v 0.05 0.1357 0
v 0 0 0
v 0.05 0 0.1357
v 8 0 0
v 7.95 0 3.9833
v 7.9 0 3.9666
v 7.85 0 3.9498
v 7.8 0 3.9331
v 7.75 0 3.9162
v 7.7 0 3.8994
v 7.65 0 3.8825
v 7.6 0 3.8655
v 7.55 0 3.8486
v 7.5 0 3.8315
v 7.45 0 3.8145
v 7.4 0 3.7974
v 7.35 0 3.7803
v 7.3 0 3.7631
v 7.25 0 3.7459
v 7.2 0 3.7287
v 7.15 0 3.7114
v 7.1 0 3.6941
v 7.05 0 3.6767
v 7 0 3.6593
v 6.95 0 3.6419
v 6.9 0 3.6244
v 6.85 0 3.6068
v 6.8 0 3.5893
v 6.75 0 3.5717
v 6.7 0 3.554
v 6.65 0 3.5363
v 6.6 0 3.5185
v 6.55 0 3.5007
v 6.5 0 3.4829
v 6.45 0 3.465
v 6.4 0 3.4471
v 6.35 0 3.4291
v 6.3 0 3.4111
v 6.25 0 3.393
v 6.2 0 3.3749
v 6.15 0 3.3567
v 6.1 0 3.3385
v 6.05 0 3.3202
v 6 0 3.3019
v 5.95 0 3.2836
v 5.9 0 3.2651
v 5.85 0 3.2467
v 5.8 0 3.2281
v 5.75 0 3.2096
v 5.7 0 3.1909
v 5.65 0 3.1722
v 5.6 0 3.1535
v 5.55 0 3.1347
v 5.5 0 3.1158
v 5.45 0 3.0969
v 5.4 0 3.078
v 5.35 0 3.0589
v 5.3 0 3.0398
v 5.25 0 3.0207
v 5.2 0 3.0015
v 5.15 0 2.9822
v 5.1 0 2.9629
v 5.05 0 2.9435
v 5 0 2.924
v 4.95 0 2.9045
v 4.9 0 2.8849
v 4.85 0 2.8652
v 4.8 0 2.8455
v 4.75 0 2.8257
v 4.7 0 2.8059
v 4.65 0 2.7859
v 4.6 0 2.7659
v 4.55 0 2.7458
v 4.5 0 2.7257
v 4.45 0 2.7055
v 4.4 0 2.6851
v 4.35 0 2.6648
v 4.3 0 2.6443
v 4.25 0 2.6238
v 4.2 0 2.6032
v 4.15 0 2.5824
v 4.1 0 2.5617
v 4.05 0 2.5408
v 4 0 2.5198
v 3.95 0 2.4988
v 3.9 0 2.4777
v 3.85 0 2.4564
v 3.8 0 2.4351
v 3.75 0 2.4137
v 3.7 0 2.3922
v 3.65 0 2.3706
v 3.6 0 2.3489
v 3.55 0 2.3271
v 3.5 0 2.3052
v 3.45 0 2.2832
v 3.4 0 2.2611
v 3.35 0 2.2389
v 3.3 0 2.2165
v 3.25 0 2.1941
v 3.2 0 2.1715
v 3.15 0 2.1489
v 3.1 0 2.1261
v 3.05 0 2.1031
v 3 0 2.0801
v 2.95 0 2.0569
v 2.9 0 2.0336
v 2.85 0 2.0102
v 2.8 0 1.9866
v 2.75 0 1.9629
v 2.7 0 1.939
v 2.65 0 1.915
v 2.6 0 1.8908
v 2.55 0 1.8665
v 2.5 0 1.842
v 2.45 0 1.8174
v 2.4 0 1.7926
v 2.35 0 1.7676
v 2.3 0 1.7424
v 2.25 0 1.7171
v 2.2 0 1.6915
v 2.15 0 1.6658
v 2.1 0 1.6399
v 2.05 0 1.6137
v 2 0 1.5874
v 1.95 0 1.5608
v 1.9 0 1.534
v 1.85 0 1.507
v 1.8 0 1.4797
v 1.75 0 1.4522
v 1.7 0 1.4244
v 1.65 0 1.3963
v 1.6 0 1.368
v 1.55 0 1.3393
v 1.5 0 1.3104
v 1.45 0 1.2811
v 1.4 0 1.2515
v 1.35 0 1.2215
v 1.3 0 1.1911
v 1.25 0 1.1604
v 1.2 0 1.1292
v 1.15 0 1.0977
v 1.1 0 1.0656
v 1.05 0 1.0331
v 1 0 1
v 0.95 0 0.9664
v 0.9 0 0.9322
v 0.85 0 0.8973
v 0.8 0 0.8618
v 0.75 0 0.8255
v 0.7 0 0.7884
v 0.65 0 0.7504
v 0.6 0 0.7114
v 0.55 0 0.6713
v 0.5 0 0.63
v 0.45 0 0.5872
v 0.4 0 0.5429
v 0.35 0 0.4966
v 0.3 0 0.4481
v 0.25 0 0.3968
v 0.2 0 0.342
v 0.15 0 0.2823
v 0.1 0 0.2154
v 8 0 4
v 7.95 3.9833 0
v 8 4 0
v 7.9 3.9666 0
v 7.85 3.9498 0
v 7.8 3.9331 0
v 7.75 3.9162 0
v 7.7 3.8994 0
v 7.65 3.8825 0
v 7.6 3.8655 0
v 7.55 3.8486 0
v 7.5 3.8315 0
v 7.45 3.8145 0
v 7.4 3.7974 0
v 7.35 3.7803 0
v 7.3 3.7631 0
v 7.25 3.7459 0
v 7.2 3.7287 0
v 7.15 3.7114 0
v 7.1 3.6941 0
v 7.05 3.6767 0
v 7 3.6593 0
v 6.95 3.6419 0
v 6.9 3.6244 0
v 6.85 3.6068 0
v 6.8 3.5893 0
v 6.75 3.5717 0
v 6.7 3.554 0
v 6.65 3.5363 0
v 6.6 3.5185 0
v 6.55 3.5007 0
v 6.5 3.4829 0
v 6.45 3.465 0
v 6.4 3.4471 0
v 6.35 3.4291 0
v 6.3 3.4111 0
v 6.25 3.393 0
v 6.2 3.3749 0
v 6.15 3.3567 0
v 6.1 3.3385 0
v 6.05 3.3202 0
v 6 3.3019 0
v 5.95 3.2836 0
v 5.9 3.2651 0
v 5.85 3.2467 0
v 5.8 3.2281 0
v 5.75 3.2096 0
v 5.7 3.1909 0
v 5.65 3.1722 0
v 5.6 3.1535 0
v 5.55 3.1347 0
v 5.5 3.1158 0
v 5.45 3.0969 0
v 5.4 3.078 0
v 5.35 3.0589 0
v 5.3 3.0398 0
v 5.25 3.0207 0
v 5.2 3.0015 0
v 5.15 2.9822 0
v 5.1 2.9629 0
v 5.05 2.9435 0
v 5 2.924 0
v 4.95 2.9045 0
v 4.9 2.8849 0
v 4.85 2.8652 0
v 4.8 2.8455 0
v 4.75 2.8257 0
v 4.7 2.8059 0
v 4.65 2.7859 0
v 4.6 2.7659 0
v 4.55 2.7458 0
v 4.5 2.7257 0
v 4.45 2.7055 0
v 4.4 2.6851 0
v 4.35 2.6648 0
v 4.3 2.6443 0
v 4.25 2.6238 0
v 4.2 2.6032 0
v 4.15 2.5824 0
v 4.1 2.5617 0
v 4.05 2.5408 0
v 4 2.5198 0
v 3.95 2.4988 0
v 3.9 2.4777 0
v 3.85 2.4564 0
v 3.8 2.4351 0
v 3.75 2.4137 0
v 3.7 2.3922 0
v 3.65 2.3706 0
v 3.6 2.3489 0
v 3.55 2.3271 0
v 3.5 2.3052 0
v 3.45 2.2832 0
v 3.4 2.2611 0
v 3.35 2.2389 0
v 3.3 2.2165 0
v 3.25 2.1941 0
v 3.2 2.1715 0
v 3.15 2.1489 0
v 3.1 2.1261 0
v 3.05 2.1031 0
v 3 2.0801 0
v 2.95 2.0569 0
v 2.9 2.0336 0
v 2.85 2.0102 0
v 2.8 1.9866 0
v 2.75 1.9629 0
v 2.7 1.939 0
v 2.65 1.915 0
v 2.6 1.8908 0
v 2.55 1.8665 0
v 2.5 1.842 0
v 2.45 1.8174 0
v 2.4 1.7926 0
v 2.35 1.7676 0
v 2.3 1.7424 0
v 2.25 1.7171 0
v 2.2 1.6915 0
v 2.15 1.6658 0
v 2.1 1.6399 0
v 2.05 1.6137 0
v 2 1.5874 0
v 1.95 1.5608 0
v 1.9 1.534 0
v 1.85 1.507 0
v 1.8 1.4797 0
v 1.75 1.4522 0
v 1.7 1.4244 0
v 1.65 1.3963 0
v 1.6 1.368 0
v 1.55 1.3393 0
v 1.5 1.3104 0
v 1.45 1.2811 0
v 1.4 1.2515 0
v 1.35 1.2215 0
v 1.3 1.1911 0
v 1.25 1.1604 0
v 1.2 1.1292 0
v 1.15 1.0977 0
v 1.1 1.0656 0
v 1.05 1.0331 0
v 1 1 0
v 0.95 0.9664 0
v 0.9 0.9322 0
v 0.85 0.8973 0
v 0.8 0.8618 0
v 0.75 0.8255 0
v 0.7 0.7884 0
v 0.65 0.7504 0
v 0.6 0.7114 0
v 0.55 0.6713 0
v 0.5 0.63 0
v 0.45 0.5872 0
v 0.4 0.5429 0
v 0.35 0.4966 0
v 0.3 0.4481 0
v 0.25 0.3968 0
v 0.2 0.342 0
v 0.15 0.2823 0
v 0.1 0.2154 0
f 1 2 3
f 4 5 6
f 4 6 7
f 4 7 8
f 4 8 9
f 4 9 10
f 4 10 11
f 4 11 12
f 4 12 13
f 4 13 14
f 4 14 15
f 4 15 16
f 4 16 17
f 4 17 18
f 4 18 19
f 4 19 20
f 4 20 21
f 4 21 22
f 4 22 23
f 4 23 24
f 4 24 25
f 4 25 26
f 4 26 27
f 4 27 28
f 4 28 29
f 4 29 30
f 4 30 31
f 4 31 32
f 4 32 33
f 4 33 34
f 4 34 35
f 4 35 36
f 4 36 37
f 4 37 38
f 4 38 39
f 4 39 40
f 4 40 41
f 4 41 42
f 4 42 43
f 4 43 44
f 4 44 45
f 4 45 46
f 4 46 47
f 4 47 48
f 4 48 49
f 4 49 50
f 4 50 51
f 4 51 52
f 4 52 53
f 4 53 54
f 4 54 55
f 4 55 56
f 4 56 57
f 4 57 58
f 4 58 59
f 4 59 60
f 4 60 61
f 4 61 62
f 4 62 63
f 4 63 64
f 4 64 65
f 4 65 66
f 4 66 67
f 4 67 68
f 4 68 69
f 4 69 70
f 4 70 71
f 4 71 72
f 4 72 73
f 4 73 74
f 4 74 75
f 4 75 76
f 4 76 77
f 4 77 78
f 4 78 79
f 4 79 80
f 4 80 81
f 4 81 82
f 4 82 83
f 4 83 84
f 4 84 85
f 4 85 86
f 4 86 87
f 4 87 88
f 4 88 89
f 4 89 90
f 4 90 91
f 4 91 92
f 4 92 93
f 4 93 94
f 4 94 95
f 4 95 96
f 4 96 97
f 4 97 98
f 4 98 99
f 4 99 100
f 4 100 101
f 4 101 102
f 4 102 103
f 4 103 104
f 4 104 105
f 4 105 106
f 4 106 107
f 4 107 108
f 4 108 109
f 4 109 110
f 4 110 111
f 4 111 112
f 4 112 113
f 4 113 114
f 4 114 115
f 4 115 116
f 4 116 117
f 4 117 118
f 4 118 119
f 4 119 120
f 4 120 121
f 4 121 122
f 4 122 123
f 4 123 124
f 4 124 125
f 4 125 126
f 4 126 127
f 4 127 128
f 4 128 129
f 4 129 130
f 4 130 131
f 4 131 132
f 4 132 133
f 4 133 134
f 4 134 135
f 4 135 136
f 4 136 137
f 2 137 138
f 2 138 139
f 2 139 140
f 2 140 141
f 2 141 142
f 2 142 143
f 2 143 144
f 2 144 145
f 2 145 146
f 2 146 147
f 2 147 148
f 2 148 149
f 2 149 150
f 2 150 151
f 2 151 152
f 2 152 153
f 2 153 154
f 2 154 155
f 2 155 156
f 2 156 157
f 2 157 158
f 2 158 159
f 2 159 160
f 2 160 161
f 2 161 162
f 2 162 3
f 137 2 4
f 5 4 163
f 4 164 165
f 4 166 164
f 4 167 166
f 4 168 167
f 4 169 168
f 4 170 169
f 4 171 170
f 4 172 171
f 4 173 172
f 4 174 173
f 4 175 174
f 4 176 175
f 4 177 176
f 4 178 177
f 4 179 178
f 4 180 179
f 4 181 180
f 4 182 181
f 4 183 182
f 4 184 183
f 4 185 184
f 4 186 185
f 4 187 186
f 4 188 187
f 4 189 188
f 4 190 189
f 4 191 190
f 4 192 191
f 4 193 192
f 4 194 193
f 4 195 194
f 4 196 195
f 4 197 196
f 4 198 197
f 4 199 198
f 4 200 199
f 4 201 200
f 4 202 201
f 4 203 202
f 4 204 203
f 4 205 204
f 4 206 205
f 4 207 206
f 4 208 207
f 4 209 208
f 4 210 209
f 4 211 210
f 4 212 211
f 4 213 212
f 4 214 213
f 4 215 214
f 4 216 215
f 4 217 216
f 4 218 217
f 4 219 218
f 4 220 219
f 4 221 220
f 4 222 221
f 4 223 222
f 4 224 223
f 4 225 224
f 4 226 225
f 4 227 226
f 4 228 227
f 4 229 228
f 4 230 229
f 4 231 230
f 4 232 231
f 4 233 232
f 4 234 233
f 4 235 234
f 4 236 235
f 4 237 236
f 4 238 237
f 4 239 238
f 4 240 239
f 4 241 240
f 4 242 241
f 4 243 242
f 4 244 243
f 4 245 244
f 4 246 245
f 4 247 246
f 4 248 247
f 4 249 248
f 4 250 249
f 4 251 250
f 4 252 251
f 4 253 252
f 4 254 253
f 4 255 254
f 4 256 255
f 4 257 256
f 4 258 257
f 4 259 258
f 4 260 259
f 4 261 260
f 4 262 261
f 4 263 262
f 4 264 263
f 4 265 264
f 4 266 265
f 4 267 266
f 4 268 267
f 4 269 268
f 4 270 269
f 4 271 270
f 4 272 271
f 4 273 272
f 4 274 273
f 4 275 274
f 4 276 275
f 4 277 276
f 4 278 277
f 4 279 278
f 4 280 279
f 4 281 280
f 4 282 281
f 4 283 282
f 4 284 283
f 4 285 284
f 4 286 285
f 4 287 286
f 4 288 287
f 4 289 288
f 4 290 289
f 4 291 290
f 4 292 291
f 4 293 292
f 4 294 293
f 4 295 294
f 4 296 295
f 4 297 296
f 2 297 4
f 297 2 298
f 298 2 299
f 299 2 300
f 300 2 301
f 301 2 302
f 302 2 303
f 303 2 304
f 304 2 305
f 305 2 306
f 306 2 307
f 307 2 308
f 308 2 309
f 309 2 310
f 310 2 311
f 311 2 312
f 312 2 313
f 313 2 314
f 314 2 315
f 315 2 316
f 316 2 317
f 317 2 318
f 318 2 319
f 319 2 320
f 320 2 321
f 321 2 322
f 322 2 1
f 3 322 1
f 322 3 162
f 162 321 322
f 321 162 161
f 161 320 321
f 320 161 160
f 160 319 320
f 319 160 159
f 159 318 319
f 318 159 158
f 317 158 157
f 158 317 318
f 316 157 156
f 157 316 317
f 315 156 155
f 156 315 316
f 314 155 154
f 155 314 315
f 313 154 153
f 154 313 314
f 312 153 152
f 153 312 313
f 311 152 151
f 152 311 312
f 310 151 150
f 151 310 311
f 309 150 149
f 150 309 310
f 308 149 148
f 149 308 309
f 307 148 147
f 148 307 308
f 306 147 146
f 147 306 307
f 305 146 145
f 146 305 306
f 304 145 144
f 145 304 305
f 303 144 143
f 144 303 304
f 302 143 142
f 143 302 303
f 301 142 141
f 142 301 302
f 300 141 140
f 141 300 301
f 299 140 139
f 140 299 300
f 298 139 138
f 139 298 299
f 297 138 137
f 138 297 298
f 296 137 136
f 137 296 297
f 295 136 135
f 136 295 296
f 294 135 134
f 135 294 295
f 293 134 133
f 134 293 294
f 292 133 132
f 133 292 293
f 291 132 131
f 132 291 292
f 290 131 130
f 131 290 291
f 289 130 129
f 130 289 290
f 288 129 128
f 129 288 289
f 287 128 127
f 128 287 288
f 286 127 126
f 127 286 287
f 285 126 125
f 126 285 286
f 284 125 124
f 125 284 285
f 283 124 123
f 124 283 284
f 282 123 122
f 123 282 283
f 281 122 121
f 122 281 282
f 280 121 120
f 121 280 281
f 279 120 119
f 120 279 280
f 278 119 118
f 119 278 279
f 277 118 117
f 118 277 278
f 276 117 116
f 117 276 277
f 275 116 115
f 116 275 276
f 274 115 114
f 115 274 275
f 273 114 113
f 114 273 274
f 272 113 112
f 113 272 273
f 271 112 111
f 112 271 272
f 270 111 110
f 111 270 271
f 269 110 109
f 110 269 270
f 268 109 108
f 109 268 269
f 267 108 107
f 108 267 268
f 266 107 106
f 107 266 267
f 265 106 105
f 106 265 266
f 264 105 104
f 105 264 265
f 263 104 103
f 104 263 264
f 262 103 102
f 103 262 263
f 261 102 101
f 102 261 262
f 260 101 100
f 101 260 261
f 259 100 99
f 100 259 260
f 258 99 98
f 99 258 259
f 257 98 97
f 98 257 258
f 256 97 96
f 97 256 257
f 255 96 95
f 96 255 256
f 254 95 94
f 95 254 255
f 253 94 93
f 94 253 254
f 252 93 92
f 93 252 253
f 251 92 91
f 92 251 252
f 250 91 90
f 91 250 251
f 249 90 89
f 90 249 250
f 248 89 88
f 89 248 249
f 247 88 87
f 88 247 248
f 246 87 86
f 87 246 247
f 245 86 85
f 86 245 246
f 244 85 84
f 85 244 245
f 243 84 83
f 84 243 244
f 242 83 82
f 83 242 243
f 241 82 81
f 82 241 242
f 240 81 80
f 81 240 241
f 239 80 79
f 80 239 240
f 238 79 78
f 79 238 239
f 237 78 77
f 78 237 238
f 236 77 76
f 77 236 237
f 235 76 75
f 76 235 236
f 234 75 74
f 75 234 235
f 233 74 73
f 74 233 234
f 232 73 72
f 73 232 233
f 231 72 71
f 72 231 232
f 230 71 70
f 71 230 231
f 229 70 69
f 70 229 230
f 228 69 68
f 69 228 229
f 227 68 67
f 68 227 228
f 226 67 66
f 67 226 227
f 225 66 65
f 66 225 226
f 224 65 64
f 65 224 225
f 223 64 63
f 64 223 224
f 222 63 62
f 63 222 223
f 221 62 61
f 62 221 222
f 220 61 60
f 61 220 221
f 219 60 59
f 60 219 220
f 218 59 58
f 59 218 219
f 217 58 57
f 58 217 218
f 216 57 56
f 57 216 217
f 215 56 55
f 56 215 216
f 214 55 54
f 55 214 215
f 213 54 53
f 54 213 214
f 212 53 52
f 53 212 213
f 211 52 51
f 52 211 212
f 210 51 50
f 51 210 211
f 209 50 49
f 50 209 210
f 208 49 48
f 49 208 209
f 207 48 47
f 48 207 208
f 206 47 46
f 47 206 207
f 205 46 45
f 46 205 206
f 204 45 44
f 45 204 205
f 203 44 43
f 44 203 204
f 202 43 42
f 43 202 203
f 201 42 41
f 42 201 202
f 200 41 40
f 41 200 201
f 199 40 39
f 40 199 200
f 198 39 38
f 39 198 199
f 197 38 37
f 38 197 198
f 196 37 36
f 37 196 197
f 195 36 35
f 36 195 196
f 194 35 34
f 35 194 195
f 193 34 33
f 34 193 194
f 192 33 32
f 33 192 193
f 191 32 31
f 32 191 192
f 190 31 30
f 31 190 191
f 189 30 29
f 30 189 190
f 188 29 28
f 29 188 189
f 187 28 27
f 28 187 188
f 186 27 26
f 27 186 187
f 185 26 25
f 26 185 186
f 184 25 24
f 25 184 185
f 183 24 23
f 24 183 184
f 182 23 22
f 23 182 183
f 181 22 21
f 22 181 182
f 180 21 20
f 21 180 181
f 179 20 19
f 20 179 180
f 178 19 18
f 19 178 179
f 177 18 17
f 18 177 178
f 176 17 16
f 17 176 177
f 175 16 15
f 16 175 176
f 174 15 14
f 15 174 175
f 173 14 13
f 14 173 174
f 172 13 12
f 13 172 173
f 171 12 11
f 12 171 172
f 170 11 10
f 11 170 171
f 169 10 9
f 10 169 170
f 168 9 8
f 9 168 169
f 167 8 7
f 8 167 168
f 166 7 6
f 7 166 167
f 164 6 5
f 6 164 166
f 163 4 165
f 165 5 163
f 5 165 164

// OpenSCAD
// Models 3D objects by taking a 2D base (defined by two functions and two x values), slicing it up perpendicular to the X-axis, and using the resulting line as a base for another 2D object.
// The slices are trapezoidal approximations with adjustable width.
// It can also rotate about the X- and Y-axis.


// starting x value
StartX = 0;
// ending x value
EndX = 8;
// size of slice
StepX = 0.05;


// f(x) and g(x) are functions.
// Math functions can be found here:
// https://openscad.org/cheatsheet
function f(x) = x^(2/3);
function g(x) = 0;


// "Slice" should be a list of points of [y,z].  These are the slices.
// It will later be scaled so that difference between f(x) and g(x) is 1, and translated so that [0,0] is on the line f(x).
// This means that any shape with a flat base will start off with "Slice = [[0,0], [1,0], ..."
// Also, please contain the y values to between 0 and 1.
// ...or you could just use one of these pre-made ones by uncommenting it and commenting out the rest.
// (Comments are denoted by the "//" at the beginning of the line.)

// semicircle
//Slice = [for(a = [0:1:180]) [(cos(a)/2)+0.5, (sin(a)/2)]];

// circle (not rotation)
//Slice = [for(a = [0:1:360]) [(cos(a)/2)+0.5, (sin(a)/2)]];

// isosceles right triangle with leg on base(right angle closest to x axis)
Slice = [[0,0], [1,0], [0,1]];

// isosceles right triangle with leg on base(right angle farthest from x axis)
//Slice = [[0,0], [1,0], [1,1]];

// isosceles right triangle with hypotenuse on base
//Slice = [[0,0], [1,0], [0.5,0.5]];

// equilateral triangle
//Slice = [[0,0], [1,0], [0.5,(3^(1/2))/2]];

// square
//Slice = [[0,0], [1,0], [1,1], [0,1]];


// This should be "true" or "false".  If it is "false", it does regular slices.  If it is "true", it rotates about an axis.
// Note: If you rotate, neither of the functions can be negative.
Rotation = false;

// This is for rotation, the number of sides the circle has.  If it is "false", sets it to OpenSCAD's default value.
NumberOfSteps = 100;

// If it is "true", it will rotate around the X-Axis. If it is "false", it will rotate around the Y-Axis
XAxisRotation = false;


// That's it! Everything else is code that doesn't need to change.
// If you are having problems you could try:
// https://openscad.org/cheatsheet
// https://en.wikibooks.org/wiki/OpenSCAD_User_Manual
// or me: rfboerwinkle@gmail.com


// P.S. If you want holes, you can use this "Paths" variable.  You can learn more in the user manual.
Paths = false;

if(Rotation){
	polygonpoints = [for (x = [StartX:StepX:EndX]) [x,f(x)], for (x = [EndX:-StepX:StartX]) [x,g(x)]];
	if(XAxisRotation){
		rotate(a = [0,-90,0])
		rotate_extrude($fn = NumberOfSteps)
		rotate(a = [0,0,-90])
		polygon(points = polygonpoints);
	}else{
		rotate(a = [-90,0,0])
		rotate_extrude($fn = NumberOfSteps)
		polygon(points = polygonpoints);
	}
}else{
	pointlist = [for (x = [StartX:StepX:EndX]) [x, (f(x)>g(x)?f(x):g(x)), (f(x)>g(x)?g(x):f(x))]];
	for(i = [1:len(pointlist)-1]){
		if((pointlist[i][1] - pointlist[i][2]) != 0){
			scalefactor = (pointlist[i-1][1] - pointlist[i-1][2]) / (pointlist[i][1] - pointlist[i][2]);
			distance = (scalefactor == 0) ? -pointlist[i-1][1] : (((pointlist[i][2] - pointlist[i-1][2]) / (1-scalefactor)) - pointlist[i][2]);
			rotate(a = [90,0,90])
			mirror(v = [0,0,1])
			translate(v = [-distance,0,-pointlist[i][0]])
			linear_extrude(height = StepX, scale = scalefactor, slices = 1)
			translate(v = [distance,0,0])
			translate(v = [pointlist[i][2],0,0])
			resize([(pointlist[i][1] - pointlist[i][2]),0,0], auto=true)
			polygon(points = Slice, paths = Paths);
			if(i+1 < len(pointlist) && (pointlist[i+1][1] - pointlist[i+1][2]) == 0){
				rotate(a = [90,0,90])
				mirror(v = [0,0,1])
				translate(v = [-distance,0,-pointlist[i][0]])
				mirror(v = [0,0,1])
				linear_extrude(height = StepX, scale = 0, slices = 1)
				translate(v = [distance,0,0])
				translate(v = [pointlist[i][2],0,0])
				resize([(pointlist[i][1] - pointlist[i][2]),0,0], auto=true)
				polygon(points = Slice, paths = Paths);
			}
		}
	}
}
